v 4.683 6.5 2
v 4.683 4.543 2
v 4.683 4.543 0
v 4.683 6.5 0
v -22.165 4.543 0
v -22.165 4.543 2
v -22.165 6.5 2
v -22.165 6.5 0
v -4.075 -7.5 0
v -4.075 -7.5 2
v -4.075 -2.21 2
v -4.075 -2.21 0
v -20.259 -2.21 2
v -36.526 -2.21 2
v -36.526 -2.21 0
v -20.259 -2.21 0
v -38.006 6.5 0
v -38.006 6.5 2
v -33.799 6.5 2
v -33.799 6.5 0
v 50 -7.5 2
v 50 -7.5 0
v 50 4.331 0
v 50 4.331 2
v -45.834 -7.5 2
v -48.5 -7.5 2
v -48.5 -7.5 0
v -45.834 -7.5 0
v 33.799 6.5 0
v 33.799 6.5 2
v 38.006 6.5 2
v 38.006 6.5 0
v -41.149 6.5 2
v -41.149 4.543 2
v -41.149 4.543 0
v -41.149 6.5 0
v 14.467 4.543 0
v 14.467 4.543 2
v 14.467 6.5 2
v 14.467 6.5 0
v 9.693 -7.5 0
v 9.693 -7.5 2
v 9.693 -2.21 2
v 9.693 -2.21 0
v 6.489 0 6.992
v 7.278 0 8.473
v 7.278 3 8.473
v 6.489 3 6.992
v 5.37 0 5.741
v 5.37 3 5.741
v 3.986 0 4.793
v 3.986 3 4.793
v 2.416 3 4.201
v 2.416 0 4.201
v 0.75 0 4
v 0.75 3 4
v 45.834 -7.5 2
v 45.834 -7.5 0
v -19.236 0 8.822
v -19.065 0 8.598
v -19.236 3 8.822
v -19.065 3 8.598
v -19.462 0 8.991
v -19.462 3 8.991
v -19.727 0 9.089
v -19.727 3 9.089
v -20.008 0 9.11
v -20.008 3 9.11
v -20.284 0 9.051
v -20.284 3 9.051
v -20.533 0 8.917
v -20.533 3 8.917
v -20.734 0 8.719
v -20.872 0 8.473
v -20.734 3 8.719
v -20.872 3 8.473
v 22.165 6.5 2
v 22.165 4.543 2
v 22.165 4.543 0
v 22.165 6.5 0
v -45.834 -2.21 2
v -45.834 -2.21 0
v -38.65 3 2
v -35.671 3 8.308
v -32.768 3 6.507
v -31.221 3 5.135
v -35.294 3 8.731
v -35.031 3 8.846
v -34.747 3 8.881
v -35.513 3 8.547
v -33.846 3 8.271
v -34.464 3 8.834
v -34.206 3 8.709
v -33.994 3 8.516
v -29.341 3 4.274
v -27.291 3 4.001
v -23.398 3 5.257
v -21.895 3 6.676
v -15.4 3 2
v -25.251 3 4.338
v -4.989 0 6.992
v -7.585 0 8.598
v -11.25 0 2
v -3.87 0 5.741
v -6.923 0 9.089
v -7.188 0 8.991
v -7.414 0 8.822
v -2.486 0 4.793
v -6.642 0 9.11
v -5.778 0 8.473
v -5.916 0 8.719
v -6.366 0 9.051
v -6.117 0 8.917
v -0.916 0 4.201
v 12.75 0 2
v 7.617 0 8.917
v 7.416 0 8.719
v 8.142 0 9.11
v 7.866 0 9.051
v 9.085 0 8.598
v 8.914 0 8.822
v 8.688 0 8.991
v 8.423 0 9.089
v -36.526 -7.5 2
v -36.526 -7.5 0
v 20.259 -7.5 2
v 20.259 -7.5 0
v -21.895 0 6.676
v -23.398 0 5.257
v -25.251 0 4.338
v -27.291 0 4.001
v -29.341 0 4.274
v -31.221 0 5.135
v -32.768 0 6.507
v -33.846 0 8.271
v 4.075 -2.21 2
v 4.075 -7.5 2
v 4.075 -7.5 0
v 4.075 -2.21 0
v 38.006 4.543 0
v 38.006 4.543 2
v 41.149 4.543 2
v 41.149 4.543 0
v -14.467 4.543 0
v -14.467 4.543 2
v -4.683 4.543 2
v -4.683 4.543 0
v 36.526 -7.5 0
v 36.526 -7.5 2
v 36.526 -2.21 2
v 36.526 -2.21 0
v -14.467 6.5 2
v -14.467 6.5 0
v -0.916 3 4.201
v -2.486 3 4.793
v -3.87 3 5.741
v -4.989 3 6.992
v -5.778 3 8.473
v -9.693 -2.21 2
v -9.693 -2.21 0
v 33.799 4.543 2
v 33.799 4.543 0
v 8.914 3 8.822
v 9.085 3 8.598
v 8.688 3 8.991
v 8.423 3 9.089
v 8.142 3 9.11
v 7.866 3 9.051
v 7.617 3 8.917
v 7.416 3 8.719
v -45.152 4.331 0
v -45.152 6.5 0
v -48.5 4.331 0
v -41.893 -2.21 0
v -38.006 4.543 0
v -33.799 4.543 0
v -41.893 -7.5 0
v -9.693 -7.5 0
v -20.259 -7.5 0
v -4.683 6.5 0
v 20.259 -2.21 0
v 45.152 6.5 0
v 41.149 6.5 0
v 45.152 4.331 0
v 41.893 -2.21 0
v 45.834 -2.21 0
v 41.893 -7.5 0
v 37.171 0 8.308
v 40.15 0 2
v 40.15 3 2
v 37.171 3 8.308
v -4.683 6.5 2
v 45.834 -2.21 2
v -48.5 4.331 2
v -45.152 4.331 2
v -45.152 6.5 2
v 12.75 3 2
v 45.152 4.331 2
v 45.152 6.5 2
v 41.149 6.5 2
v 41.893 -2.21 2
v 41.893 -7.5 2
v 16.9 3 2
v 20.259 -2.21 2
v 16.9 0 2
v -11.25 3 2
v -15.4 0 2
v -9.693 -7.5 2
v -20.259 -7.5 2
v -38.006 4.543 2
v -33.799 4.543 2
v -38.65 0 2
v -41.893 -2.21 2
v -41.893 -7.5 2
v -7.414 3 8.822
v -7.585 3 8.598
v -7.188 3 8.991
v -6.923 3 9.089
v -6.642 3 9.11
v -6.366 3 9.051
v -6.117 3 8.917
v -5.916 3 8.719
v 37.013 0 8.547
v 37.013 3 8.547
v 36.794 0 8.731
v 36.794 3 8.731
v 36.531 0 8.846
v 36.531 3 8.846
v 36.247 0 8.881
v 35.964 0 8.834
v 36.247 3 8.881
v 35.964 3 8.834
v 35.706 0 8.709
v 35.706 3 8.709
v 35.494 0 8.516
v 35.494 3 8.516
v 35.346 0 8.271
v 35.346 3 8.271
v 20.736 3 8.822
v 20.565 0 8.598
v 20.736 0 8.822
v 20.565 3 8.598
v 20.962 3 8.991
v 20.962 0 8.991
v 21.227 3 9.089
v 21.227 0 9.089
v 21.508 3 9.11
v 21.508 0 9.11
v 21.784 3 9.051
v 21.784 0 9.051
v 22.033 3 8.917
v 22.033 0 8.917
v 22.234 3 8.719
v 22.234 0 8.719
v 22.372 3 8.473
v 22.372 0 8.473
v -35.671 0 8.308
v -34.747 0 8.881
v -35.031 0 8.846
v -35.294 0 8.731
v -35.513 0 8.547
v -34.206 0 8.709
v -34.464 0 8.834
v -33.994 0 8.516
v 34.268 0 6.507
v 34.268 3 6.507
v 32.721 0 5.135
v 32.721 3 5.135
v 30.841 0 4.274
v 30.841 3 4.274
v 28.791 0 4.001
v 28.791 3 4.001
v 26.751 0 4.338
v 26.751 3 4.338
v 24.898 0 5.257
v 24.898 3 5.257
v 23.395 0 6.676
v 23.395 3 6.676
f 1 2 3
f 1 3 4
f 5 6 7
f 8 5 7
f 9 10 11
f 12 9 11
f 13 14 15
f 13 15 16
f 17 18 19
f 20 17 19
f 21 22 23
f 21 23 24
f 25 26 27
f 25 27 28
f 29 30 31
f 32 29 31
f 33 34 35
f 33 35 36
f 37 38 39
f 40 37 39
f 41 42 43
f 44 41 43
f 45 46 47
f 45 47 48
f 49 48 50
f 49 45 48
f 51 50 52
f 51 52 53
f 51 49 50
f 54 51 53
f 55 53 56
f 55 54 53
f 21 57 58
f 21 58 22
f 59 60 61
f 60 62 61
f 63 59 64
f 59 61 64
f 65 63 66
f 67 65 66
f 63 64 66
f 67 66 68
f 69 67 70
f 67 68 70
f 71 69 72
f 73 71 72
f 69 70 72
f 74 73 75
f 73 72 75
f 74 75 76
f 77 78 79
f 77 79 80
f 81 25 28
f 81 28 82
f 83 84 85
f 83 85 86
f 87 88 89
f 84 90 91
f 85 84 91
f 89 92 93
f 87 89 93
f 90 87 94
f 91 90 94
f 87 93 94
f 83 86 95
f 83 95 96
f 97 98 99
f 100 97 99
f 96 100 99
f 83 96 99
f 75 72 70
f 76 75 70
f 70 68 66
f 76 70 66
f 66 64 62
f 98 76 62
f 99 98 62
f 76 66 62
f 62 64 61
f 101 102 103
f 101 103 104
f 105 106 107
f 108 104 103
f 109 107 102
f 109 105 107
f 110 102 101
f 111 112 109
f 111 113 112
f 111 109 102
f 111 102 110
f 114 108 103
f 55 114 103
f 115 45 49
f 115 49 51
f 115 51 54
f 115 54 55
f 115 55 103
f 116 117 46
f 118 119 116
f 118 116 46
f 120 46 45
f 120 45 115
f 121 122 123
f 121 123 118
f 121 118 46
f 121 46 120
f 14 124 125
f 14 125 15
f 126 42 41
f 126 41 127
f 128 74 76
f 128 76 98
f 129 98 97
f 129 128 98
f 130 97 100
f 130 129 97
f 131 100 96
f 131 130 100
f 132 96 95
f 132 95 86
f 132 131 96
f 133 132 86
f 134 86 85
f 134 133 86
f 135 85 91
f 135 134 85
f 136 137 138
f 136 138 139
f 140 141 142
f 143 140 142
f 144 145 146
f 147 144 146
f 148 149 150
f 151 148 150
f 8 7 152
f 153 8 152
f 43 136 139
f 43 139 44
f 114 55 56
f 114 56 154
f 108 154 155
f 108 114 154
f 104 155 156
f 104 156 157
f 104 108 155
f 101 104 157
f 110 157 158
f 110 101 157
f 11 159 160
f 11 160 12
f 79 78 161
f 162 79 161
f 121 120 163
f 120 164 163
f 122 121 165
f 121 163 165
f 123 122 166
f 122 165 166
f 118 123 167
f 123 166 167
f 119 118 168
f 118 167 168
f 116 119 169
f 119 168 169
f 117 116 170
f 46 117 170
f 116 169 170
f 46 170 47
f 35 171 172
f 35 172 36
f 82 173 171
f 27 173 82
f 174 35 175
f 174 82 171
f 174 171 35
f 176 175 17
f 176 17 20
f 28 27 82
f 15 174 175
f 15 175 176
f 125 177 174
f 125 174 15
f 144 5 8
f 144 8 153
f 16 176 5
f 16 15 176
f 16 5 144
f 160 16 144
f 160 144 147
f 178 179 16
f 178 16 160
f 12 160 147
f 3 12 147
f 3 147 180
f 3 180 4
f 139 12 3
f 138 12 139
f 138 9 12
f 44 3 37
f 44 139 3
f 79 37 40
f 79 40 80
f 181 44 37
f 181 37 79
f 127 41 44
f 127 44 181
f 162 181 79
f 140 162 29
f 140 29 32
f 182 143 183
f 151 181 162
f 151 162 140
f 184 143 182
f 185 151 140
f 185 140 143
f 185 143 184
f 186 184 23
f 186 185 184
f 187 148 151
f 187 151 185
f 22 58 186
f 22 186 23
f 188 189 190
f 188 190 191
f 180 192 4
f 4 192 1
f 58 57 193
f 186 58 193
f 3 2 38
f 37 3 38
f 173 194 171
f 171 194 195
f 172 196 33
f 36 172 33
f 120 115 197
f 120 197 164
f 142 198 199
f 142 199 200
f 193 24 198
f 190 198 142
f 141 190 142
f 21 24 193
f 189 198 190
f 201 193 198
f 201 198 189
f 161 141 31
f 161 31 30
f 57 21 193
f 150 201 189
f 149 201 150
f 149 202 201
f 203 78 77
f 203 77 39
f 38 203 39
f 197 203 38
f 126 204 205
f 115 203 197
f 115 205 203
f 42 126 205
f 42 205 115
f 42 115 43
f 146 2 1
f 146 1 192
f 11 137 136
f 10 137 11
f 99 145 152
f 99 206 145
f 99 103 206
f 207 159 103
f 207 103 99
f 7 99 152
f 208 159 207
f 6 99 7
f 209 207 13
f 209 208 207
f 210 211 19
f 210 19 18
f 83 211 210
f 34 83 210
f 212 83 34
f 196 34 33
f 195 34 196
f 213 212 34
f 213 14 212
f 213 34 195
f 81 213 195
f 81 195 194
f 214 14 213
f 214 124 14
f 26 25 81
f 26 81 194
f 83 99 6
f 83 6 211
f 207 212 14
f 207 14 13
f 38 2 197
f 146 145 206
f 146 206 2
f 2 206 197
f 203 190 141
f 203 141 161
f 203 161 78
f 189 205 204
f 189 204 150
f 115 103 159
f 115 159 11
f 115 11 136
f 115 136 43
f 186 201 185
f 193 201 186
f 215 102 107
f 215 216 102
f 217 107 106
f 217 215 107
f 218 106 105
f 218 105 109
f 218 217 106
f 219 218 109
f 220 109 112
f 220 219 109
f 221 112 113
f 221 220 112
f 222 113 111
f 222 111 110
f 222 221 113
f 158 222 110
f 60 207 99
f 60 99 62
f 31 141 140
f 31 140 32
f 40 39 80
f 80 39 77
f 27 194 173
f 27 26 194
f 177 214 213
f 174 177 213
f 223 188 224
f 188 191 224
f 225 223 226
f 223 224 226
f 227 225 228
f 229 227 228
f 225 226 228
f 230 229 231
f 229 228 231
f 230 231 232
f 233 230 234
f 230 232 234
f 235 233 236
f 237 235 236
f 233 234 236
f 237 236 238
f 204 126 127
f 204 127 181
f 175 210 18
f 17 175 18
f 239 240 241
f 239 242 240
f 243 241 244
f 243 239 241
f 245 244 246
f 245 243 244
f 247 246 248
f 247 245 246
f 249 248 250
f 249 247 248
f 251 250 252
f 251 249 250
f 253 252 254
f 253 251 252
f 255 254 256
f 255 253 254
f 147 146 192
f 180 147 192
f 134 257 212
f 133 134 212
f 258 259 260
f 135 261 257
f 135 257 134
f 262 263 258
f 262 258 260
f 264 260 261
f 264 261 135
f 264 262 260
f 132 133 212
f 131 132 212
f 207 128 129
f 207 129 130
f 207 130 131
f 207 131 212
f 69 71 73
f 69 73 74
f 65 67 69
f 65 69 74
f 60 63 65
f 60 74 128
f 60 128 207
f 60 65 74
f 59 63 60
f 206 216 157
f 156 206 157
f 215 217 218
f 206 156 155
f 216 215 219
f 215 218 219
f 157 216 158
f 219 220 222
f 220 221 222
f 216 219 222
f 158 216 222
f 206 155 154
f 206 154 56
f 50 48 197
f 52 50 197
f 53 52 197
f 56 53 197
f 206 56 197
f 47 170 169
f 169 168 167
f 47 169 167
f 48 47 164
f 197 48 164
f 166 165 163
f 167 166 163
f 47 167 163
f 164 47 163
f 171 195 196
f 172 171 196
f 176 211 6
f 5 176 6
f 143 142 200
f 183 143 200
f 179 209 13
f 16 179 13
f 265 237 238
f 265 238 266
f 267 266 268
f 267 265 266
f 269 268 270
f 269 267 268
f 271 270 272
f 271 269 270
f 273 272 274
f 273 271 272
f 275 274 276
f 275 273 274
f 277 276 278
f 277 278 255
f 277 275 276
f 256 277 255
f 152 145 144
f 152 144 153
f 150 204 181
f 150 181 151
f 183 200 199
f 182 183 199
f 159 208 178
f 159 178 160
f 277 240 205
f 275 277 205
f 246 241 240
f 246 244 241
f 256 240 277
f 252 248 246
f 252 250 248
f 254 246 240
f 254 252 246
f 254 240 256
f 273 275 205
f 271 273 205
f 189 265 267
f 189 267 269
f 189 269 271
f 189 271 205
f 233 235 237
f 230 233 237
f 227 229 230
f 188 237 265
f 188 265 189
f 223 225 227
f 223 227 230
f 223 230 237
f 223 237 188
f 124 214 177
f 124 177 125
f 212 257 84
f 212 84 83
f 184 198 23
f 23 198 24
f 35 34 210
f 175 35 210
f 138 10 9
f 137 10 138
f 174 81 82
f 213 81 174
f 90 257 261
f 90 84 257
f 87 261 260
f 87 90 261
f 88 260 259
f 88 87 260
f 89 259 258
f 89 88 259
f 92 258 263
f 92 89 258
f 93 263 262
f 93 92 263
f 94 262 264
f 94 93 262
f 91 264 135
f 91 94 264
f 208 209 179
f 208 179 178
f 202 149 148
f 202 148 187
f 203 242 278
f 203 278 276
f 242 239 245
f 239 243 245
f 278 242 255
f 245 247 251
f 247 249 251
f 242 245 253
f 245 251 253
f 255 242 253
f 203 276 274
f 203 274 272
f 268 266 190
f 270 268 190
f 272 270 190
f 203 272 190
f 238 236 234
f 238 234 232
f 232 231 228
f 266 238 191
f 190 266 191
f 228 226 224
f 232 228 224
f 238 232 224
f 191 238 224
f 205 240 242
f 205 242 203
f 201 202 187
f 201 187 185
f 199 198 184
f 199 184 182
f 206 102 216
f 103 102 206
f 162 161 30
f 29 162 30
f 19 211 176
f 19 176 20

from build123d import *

# Parameters (mm, degrees)
F1_DEPTH = 7.5
F2_DEPTH = 3
F3_DEPTH = 6.5
F4_W     = 5.6182215922
F4_H     = 5.2901296224
F4_W_2   = 4.8481553793
F4_H_2   = 2.1686895564
F4_W_3   = 11.6345733404
F4_H_3   = 1.9571522065
F4_W_4   = 3.1425692141
F4_W_5   = 9.7834728658
F4_W_6   = 16.2676852196
F4_W_7   = 3.9411410689
F4_W_8   = 3.3481553793
F5_DEPTH = 2
F6_R     = 1


with BuildPart() as f1:
    # F0 (on Front) → F1 (new body)
    with BuildSketch(Plane.XZ):
        Polygon((-48.5, 2), (-48.5, 0), (50, 0), (50, 2), (40.15, 2), (16.9, 2), (12.75, 2), (0.75, 2), (-11.25, 2), (-15.4, 2), (-38.65, 2), align=None)
    extrude(amount=F1_DEPTH)

    # F0 (on Front) → F2 (join)
    with BuildSketch(Plane.XZ):
        with BuildLine():
            Line((16.9, 2), (40.15, 2))
            Line((40.15, 2), (35.9, 11))
            ThreePointArc((35.9, 11), (28.9, 4), (21.9, 11))
            Line((21.9, 11), (16.9, 2))
        make_face()
        with BuildLine():
            Line((0.75, 2), (12.75, 2))
            Line((12.75, 2), (7.75, 11))
            ThreePointArc((7.75, 11), (5.6997474683, 6.0502525317), (0.75, 4))
            Line((0.75, 4), (0.75, 2))
        make_face()
        with BuildLine():
            Line((-6.25, 11), (-11.25, 2))
            Line((-11.25, 2), (0.75, 2))
            Line((0.75, 2), (0.75, 4))
            ThreePointArc((0.75, 4), (-4.1997474683, 6.0502525317), (-6.25, 11))
        make_face()
        with BuildLine():
            Line((-34.4, 11), (-38.65, 2))
            Line((-38.65, 2), (-15.4, 2))
            Line((-15.4, 2), (-20.4, 11))
            ThreePointArc((-20.4, 11), (-27.4, 4), (-34.4, 11))
        make_face()
        Polygon((-48.5, 2), (-48.5, 0), (50, 0), (50, 2), (40.15, 2), (16.9, 2), (12.75, 2), (0.75, 2), (-11.25, 2), (-15.4, 2), (-38.65, 2), align=None)
    extrude(amount=-F2_DEPTH)

    # F0 (on Front) → F3 (join)
    with BuildSketch(Plane.XZ):
        Polygon((-48.5, 2), (-48.5, 0), (50, 0), (50, 2), (40.15, 2), (16.9, 2), (12.75, 2), (0.75, 2), (-11.25, 2), (-15.4, 2), (-38.65, 2), align=None)
    extrude(amount=-F3_DEPTH)

    # F4 (on face) → F5 (cut)
    with BuildSketch(Plane.XY.offset(2)):
        with Locations((6.8839930464, -4.8549351888)):
            Rectangle(F4_W, F4_H)
        with Locations((47.5759223104, 5.4156552218)):
            Rectangle(F4_W_2, F4_H_2)
        with Locations((27.9820300639, 5.5214238968)):
            Rectangle(F4_W_3, F4_H_3)
        with Locations((39.5776275545, 5.5214238968)):
            Rectangle(F4_W_4, F4_H_3)
        with Locations((9.5749795437, 5.5214238968)):
            Rectangle(F4_W_5, F4_H_3)
        with Locations((28.3925579861, -4.8549351888)):
            Rectangle(F4_W_6, F4_H)
        with Locations((43.8636317849, -4.8549351888)):
            Rectangle(F4_W_7, F4_H)
        with Locations((-6.8839930464, -4.8549351888)):
            Rectangle(F4_W, F4_H)
        with Locations((-9.5749795437, 5.5214238968)):
            Rectangle(F4_W_5, F4_H_3)
        with Locations((-28.3925579861, -4.8549351888)):
            Rectangle(F4_W_6, F4_H)
        with Locations((-27.9820300639, 5.5214238968)):
            Rectangle(F4_W_3, F4_H_3)
        with Locations((-39.5776275545, 5.5214238968)):
            Rectangle(F4_W_4, F4_H_3)
        with Locations((-43.8636317849, -4.8549351888)):
            Rectangle(F4_W_7, F4_H)
        with Locations((-46.8259223104, 5.4156552218)):
            Rectangle(F4_W_8, F4_H_2)
    extrude(amount=-F5_DEPTH, mode=Mode.SUBTRACT)

    # F6
    f6_edges = [f1.edges().sort_by_distance(p)[0] for p in [
        (35.9, 1.5, 11),
        (21.9, 1.5, 11),
        (7.75, 1.5, 11),
        (-6.25, 1.5, 11),
        (-20.4, 1.5, 11),
        (-34.4, 1.5, 11),
    ]]
    fillet(f6_edges, radius=F6_R)


solid = f1.part
